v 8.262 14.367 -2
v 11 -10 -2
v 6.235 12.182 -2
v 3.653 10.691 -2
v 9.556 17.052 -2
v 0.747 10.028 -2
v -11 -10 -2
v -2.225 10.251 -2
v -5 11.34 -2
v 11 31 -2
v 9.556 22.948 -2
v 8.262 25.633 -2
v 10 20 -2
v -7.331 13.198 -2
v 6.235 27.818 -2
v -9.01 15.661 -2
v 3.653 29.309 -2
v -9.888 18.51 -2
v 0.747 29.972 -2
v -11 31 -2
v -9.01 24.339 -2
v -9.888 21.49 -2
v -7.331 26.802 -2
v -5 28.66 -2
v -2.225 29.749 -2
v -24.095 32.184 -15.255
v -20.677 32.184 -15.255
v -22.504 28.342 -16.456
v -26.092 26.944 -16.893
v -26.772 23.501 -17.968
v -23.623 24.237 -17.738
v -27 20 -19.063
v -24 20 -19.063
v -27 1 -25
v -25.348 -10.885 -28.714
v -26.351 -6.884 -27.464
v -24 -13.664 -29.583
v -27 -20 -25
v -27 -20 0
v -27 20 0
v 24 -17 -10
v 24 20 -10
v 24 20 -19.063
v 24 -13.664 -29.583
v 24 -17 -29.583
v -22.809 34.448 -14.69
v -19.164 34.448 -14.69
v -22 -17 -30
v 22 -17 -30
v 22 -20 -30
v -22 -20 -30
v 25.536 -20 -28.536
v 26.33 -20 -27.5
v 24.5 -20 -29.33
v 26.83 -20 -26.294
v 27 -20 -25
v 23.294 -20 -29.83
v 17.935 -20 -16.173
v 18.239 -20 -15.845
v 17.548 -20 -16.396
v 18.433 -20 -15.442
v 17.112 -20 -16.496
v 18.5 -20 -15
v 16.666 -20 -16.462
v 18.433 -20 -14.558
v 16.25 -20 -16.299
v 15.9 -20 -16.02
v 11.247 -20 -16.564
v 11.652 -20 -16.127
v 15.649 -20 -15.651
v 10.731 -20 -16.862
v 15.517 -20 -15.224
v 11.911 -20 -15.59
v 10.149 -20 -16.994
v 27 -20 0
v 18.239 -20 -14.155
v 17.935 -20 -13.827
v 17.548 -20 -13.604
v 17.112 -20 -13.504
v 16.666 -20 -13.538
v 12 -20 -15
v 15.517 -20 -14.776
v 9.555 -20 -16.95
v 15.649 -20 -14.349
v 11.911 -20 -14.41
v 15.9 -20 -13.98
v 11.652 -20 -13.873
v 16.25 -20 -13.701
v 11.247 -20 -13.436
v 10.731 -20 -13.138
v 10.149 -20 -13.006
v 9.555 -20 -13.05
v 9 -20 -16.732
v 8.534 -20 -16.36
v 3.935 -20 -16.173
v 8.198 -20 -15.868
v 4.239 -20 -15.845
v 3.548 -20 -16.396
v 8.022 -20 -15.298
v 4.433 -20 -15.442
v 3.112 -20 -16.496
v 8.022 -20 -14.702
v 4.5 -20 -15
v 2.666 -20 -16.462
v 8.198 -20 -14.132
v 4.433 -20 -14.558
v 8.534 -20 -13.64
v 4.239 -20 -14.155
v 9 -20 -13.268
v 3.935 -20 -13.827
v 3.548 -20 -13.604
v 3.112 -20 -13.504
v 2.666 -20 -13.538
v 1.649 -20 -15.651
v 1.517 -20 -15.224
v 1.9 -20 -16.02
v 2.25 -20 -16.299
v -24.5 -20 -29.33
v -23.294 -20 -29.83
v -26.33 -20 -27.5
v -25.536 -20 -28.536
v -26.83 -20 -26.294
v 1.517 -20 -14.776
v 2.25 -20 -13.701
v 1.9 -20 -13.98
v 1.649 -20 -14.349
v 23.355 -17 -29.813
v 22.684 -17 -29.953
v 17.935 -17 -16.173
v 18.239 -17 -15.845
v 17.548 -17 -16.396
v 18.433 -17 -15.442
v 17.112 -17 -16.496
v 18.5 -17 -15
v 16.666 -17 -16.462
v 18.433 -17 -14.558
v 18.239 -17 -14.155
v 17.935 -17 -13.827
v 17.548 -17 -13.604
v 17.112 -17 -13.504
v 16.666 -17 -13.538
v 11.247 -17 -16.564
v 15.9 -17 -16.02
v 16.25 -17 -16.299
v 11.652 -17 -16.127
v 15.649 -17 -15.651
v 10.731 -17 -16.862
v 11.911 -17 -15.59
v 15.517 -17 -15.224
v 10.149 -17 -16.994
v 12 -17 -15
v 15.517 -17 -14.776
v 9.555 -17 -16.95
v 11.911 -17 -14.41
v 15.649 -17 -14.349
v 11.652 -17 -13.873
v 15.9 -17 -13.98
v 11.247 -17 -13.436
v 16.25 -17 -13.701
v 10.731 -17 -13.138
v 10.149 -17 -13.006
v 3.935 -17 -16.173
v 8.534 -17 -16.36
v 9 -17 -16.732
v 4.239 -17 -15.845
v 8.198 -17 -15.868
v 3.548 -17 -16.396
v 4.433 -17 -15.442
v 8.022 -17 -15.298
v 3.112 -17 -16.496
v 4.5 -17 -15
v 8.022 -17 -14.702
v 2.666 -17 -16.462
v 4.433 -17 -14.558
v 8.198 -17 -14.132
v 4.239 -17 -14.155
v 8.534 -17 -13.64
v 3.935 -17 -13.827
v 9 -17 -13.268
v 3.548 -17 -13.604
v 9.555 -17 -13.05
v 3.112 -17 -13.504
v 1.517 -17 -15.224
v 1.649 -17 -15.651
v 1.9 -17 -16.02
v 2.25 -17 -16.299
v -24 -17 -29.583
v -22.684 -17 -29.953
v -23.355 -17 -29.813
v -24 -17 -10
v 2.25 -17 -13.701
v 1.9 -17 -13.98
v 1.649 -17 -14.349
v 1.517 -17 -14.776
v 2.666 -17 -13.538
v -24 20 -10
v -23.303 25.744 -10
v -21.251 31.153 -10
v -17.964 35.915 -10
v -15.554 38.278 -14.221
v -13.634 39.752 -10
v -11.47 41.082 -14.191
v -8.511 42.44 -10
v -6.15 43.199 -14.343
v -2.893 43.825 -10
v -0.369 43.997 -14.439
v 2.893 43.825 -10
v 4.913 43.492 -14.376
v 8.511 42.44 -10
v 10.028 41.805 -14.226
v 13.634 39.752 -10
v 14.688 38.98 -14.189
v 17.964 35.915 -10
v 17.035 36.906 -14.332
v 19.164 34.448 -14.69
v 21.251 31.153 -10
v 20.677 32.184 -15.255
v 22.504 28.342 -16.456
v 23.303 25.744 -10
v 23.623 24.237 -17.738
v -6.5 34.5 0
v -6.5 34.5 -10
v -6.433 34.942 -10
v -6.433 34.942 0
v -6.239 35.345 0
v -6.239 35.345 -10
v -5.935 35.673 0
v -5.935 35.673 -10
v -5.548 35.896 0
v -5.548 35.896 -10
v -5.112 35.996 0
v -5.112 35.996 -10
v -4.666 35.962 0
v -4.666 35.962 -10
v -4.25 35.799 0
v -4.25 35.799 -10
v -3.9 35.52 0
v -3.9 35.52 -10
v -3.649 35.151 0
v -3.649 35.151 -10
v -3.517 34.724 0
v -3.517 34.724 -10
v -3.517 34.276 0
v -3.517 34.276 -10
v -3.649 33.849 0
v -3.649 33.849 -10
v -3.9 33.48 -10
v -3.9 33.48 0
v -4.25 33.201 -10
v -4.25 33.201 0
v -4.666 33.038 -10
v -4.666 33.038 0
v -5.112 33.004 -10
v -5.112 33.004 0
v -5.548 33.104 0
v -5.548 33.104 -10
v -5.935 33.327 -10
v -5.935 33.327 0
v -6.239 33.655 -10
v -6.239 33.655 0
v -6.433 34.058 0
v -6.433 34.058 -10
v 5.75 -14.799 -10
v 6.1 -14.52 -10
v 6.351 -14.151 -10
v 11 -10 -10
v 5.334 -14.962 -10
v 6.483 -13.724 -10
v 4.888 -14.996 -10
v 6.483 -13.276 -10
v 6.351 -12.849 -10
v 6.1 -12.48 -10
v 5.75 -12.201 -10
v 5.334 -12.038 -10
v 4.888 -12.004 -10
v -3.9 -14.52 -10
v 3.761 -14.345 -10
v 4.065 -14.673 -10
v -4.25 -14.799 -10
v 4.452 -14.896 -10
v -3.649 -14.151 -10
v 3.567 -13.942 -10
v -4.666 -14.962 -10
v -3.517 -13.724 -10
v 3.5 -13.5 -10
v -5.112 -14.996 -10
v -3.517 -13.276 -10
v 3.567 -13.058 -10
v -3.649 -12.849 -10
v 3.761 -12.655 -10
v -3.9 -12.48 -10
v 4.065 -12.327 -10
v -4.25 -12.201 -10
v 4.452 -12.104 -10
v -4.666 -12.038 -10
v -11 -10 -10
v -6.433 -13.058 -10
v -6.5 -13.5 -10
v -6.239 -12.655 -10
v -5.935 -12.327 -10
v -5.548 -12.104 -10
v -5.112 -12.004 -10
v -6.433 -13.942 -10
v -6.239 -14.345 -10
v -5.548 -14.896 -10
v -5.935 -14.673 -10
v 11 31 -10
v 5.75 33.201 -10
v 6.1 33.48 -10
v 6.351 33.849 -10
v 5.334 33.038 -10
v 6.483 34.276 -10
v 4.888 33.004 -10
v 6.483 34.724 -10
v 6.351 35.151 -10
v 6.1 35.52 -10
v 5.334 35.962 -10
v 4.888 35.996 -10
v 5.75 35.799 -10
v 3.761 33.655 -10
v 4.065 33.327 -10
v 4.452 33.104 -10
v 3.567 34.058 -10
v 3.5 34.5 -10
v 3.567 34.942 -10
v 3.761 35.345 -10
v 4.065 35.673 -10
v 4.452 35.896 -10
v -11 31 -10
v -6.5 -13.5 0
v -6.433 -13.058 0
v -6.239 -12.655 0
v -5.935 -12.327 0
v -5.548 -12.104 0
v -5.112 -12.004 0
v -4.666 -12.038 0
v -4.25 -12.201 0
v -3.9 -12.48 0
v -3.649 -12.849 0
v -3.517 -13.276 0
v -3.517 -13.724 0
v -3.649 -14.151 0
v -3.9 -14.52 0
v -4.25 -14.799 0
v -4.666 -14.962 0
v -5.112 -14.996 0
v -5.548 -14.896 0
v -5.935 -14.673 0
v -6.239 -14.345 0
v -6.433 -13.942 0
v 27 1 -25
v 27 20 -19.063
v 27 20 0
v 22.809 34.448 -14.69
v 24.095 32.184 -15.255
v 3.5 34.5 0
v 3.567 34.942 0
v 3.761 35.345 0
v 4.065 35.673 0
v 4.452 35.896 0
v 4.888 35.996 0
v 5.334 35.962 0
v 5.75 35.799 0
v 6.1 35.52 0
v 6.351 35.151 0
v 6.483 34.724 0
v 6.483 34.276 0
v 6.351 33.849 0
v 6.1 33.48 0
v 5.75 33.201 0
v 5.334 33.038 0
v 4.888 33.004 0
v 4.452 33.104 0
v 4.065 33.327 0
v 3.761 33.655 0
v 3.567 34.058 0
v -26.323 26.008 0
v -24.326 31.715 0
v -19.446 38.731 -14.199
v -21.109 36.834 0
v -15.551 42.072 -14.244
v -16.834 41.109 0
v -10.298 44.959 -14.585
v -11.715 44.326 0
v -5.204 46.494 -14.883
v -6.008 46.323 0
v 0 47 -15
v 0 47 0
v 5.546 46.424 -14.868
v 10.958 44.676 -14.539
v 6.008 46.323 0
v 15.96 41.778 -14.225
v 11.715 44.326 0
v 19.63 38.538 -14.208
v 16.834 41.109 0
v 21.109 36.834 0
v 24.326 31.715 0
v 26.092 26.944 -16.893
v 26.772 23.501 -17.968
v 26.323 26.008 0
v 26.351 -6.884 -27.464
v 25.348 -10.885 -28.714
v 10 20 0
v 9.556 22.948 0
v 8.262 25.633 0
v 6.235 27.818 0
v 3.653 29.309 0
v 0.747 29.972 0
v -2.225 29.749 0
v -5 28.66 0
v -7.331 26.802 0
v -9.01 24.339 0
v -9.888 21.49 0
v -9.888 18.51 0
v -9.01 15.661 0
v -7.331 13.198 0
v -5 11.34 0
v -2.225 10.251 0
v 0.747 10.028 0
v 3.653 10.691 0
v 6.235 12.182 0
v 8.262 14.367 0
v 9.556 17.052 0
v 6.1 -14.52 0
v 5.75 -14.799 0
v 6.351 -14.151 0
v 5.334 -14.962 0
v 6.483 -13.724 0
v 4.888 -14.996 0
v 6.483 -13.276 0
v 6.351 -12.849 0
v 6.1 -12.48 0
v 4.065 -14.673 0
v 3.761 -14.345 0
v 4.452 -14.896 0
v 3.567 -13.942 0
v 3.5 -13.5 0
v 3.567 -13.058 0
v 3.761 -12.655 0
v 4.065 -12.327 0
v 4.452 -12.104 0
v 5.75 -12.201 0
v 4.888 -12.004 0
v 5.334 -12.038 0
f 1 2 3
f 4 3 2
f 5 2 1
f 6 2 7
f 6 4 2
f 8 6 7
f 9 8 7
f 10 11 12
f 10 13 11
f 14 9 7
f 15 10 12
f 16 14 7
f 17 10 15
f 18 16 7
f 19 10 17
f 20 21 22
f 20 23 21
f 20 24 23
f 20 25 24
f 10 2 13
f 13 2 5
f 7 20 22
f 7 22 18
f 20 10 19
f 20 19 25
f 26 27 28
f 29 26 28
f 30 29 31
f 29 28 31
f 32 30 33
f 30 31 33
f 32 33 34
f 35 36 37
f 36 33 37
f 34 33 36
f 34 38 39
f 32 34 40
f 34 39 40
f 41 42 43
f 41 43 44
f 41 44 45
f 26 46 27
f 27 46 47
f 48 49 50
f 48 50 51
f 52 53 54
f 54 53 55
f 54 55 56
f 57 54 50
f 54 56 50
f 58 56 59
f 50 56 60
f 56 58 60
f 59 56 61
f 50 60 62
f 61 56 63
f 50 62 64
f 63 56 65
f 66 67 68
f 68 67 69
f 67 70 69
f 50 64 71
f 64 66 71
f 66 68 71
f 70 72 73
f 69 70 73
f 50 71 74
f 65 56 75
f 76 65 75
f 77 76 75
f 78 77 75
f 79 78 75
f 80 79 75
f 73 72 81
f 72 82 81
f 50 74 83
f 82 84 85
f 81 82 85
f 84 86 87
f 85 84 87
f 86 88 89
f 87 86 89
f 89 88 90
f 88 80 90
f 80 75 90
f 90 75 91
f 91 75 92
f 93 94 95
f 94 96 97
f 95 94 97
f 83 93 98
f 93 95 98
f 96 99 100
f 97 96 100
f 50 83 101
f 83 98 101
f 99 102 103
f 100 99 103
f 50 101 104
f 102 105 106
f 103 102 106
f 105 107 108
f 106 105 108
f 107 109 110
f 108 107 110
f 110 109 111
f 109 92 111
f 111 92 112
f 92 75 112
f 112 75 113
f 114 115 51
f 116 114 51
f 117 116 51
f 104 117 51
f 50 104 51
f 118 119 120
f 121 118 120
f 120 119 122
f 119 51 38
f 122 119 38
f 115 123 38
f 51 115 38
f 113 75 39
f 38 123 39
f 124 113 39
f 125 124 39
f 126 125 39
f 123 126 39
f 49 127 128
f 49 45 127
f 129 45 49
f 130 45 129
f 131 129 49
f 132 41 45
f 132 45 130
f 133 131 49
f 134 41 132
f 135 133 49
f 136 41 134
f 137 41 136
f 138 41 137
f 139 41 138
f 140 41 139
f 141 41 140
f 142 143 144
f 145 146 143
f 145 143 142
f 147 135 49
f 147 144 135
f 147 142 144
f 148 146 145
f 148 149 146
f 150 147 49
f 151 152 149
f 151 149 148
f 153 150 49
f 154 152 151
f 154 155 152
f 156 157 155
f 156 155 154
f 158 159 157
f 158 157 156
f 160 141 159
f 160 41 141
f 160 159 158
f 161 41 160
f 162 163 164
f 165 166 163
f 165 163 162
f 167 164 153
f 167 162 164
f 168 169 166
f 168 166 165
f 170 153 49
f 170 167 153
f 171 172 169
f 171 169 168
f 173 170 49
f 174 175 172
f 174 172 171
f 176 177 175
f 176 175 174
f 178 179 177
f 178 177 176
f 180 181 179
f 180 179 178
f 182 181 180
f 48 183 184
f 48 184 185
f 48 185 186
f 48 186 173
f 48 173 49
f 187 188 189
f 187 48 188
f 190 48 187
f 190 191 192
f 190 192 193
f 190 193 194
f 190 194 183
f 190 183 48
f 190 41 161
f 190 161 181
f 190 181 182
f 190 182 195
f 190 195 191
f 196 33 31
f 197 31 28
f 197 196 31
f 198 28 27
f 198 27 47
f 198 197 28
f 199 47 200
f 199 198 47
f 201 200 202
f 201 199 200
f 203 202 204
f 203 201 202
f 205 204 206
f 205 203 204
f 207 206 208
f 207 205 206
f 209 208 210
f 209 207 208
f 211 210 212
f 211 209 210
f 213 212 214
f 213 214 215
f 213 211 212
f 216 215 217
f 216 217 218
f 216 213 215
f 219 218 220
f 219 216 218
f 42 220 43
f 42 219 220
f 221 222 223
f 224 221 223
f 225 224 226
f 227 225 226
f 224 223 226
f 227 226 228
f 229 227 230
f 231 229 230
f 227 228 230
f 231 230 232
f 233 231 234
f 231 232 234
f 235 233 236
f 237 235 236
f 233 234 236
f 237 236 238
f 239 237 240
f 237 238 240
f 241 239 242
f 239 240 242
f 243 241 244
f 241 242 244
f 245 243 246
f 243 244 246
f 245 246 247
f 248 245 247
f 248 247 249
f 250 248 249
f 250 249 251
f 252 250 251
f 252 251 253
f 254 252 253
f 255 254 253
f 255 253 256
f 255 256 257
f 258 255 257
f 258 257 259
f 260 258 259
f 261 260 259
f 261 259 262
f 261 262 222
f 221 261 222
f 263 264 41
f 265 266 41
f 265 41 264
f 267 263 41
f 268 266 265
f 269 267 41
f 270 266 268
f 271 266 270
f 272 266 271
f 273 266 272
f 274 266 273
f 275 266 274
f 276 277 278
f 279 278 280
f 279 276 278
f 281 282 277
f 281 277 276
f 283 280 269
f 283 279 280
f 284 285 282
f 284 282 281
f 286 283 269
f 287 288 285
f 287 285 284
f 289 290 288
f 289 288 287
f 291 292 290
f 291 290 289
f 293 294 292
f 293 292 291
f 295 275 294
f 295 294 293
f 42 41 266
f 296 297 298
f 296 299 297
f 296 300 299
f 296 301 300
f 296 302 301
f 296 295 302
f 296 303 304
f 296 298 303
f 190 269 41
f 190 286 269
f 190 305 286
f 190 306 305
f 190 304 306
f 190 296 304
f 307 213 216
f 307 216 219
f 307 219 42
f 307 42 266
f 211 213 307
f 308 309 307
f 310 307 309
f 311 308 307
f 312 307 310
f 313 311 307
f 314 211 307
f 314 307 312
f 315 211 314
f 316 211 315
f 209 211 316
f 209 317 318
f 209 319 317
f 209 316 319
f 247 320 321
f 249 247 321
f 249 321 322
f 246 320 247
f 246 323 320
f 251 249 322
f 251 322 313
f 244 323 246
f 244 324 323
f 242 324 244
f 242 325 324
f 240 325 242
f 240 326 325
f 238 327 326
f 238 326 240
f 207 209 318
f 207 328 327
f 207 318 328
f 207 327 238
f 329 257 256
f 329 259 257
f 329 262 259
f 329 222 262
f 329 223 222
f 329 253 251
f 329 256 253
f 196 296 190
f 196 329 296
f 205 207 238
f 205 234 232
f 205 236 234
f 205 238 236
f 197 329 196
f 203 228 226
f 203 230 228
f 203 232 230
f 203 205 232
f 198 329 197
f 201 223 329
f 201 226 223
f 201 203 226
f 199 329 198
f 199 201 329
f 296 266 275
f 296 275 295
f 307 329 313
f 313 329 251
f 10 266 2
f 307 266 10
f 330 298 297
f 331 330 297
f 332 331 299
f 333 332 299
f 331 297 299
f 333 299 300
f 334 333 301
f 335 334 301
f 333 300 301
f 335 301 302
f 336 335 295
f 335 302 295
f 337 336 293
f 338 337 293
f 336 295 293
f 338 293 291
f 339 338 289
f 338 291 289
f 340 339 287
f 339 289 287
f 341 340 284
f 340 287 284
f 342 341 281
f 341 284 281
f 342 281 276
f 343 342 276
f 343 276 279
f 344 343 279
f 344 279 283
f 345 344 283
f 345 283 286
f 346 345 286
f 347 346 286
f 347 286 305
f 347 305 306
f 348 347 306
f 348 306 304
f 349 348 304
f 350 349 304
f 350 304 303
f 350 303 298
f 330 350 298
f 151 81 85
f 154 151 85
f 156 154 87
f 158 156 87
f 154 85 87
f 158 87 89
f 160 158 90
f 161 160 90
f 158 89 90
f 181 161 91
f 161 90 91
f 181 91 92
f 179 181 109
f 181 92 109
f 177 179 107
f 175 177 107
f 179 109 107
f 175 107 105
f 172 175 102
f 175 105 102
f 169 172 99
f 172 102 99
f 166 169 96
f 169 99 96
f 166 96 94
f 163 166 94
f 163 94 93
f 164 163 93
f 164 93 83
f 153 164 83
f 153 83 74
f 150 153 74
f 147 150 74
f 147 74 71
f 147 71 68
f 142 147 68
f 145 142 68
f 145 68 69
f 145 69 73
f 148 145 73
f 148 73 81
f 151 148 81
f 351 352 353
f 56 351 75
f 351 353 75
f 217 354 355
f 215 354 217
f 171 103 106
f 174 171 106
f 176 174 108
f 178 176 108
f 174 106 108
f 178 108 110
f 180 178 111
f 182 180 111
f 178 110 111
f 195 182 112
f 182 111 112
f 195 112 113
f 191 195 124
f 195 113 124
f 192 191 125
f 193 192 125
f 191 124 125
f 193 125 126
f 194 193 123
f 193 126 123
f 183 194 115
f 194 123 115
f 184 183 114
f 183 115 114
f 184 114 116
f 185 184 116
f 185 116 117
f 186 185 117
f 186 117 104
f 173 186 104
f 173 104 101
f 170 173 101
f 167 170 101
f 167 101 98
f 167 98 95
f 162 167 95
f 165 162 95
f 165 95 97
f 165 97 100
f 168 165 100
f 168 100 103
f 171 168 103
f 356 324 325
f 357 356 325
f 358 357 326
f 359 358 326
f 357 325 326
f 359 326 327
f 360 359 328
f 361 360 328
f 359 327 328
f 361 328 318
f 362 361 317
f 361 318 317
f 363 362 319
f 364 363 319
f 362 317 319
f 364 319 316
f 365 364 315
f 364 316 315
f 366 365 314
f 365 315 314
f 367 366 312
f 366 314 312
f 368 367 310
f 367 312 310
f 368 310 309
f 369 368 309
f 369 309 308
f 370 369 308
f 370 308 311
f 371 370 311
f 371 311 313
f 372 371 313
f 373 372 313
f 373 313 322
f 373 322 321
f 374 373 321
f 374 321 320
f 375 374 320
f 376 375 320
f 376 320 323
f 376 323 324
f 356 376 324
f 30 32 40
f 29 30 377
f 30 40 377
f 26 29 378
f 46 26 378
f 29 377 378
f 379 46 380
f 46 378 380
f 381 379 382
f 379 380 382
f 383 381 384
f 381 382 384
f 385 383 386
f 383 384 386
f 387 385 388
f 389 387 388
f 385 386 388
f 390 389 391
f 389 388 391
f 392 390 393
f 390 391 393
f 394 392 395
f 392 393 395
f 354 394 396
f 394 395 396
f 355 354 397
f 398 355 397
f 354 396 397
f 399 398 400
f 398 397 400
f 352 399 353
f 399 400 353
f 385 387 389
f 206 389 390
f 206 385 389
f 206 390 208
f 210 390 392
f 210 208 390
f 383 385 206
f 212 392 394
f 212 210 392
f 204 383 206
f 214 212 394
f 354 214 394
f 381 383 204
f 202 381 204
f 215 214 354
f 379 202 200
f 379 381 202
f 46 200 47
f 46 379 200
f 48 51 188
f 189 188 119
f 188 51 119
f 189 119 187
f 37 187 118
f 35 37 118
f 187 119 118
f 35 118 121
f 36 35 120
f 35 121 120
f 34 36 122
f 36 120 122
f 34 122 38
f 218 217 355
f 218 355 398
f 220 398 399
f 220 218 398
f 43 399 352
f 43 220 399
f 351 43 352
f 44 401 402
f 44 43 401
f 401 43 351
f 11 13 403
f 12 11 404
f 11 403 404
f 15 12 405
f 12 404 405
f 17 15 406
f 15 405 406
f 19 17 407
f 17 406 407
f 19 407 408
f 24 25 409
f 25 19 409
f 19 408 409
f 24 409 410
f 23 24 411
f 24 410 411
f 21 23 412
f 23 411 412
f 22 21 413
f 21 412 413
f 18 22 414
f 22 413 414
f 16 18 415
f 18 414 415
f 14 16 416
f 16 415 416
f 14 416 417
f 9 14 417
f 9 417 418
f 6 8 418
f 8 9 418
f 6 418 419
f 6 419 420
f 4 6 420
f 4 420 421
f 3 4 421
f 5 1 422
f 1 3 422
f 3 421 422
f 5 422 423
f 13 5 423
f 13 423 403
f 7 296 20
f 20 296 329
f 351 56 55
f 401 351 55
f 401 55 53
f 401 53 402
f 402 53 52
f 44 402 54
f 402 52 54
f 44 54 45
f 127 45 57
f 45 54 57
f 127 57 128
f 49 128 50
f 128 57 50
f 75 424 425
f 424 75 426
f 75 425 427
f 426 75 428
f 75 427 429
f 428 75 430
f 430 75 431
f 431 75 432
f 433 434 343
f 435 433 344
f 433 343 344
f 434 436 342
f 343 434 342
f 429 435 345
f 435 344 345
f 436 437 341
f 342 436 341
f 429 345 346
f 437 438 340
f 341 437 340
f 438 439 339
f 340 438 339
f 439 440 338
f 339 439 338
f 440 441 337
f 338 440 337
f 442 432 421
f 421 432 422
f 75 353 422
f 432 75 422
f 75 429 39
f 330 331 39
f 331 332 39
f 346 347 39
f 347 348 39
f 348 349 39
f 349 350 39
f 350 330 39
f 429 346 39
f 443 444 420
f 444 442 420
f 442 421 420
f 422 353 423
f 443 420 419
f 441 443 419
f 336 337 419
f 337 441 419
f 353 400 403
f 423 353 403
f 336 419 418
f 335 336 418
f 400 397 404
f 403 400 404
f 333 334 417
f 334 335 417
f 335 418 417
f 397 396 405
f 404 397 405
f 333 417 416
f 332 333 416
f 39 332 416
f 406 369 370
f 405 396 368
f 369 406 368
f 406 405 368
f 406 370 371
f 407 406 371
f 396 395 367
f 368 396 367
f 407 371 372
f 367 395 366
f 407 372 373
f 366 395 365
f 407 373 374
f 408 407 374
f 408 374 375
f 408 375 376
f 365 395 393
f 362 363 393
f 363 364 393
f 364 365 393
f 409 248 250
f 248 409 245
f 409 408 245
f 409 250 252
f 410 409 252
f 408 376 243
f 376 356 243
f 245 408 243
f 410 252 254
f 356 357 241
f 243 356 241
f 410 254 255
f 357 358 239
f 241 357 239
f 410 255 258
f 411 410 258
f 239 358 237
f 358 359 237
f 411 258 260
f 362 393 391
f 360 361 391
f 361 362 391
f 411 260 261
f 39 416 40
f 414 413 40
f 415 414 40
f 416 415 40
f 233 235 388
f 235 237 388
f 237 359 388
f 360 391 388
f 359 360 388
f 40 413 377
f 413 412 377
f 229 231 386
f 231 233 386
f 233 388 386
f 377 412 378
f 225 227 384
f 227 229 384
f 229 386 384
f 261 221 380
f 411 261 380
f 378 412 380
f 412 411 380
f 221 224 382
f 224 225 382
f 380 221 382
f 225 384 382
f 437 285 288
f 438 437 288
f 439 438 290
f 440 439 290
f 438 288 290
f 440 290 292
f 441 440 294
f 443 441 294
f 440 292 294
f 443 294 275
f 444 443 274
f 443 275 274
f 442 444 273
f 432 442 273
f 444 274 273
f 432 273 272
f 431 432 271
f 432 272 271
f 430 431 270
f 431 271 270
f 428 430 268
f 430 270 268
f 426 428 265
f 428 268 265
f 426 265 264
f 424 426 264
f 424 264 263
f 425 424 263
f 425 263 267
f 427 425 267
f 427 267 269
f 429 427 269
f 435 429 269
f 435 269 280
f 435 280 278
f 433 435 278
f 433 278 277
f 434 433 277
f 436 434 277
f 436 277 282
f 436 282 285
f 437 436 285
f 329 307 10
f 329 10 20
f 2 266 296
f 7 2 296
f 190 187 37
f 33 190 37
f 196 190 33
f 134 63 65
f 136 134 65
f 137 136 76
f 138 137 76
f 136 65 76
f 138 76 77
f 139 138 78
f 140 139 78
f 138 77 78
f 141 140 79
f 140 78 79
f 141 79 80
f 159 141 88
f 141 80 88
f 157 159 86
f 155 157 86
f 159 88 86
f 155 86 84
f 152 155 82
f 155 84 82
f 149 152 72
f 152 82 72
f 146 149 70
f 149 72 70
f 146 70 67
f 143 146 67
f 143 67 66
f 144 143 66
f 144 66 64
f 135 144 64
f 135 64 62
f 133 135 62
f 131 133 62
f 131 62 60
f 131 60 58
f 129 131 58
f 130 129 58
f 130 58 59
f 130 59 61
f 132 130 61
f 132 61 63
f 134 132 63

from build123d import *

# Parameters (mm, degrees)
BOSS_EXTRUDE1_DEPTH     = 30
SKETCH3_4_R             = 10
BOSS_EXTRUDE2_DEPTH     = 10
SKETCH4_R               = 1.5
SKETCH4_R_2             = 2
CUT_EXTRUDE1_DEPTH      = 10
CUT_EXTRUDE2_DEPTH      = 28
CUT_EXTRUDE2_DEPTH_BACK = 28
SKETCH6_W               = 22
SKETCH6_H               = 41
SKETCH6_R               = 10
CUT_EXTRUDE3_DEPTH      = 8
SKETCH6_3_R             = 1.5
CUT_EXTRUDE4_DEPTH      = 11.0000001
CUT_EXTRUDE5_DEPTH      = 68.0000001


with BuildPart() as part:
    # Sketch3 → Boss-Extrude1 (new body)
    with BuildSketch(Plane.XY):
        with BuildLine():
            ThreePointArc((-27, 20), (0, 47), (27, 20))
            Line((27, 20), (27, -20))
            Line((27, -20), (-27, -20))
            Line((-27, -20), (-27, 20))
        make_face()
        with BuildLine():
            Line((-24, -17), (-24, 20))
            ThreePointArc((-24, 20), (0, 44), (24, 20))
            Line((24, 20), (24, -17))
            Line((24, -17), (-24, -17))
        make_face(mode=Mode.SUBTRACT)
    extrude(amount=-BOSS_EXTRUDE1_DEPTH)

    # Sketch3<4> → Boss-Extrude2 (add)
    with BuildSketch(Plane.XY):
        with BuildLine():
            ThreePointArc((-24, 20), (0, 44), (24, 20))
            Line((24, 20), (24, -17))
            Line((24, -17), (-24, -17))
            Line((-24, -17), (-24, 20))
        make_face()
        with Locations((0, 20)):
            Circle(SKETCH3_4_R, mode=Mode.SUBTRACT)
    extrude(amount=-BOSS_EXTRUDE2_DEPTH)

    # Sketch4 → Cut-Extrude1 (cut)
    with BuildSketch(Plane.XZ.offset(20)):
        with Locations((3, -15)):
            Circle(SKETCH4_R)
        with Locations((17, -15)):
            Circle(SKETCH4_R)
        with Locations((10, -15)):
            Circle(SKETCH4_R_2)
    extrude(amount=-CUT_EXTRUDE1_DEPTH, mode=Mode.SUBTRACT)

    # Sketch5 → Cut-Extrude2 (cut, two sides)
    with BuildSketch(Plane(origin=(0, 0, 0), x_dir=(0, 0, -1), z_dir=(1, 0, 0))) as cut_extrude2_sk:
        with BuildLine():
            Line((15.255034443, 32.183889783), (30, -15))
            Line((30, -15), (30, 47))
            Line((30, 47), (15, 47))
            ThreePointArc((15, 47), (14.181044165, 40.740478791), (14.690093427, 34.448168938))
            ThreePointArc((14.690093427, 34.448168938), (14.93950997, 33.307782347), (15.255034443, 32.183889783))
        make_face()
    extrude(amount=CUT_EXTRUDE2_DEPTH, mode=Mode.SUBTRACT)
    extrude(cut_extrude2_sk.sketch, amount=-CUT_EXTRUDE2_DEPTH_BACK, mode=Mode.SUBTRACT)

    # Sketch6 → Cut-Extrude3 (cut)
    with BuildSketch(Plane(origin=(0, 0, -10), x_dir=(-1, 0, 0), z_dir=(0, 0, -1))):
        with Locations((0, 10.5)):
            Rectangle(SKETCH6_W, SKETCH6_H)
        with Locations((0, 20)):
            Circle(SKETCH6_R, mode=Mode.SUBTRACT)
    extrude(amount=-CUT_EXTRUDE3_DEPTH, mode=Mode.SUBTRACT)

    # Sketch6<3> → Cut-Extrude4 (cut, through all)
    with BuildSketch(Plane(origin=(0, 0, -10), x_dir=(-1, 0, 0), z_dir=(0, 0, -1))):
        with Locations((-5, 34.5)):
            Circle(SKETCH6_3_R)
        with Locations((5, 34.5)):
            Circle(SKETCH6_3_R)
        with Locations((5, -13.5)):
            Circle(SKETCH6_3_R)
        with Locations((-5, -13.5)):
            Circle(SKETCH6_3_R)
    extrude(amount=-CUT_EXTRUDE4_DEPTH, mode=Mode.SUBTRACT)

    # Sketch7 → Cut-Extrude5 (cut, through all)
    with BuildSketch(Plane.XZ.offset(20)):
        with BuildLine():
            Line((-27, -25), (-27, -30))
            Line((-27, -30), (-22, -30))
            ThreePointArc((-22, -30), (-25.535533906, -28.535533906), (-27, -25))
        make_face()
        with BuildLine():
            Line((22, -30), (27, -30))
            Line((27, -30), (27, -25))
            ThreePointArc((27, -25), (25.535533906, -28.535533906), (22, -30))
        make_face()
    extrude(amount=-CUT_EXTRUDE5_DEPTH, mode=Mode.SUBTRACT)


solid = part.part
